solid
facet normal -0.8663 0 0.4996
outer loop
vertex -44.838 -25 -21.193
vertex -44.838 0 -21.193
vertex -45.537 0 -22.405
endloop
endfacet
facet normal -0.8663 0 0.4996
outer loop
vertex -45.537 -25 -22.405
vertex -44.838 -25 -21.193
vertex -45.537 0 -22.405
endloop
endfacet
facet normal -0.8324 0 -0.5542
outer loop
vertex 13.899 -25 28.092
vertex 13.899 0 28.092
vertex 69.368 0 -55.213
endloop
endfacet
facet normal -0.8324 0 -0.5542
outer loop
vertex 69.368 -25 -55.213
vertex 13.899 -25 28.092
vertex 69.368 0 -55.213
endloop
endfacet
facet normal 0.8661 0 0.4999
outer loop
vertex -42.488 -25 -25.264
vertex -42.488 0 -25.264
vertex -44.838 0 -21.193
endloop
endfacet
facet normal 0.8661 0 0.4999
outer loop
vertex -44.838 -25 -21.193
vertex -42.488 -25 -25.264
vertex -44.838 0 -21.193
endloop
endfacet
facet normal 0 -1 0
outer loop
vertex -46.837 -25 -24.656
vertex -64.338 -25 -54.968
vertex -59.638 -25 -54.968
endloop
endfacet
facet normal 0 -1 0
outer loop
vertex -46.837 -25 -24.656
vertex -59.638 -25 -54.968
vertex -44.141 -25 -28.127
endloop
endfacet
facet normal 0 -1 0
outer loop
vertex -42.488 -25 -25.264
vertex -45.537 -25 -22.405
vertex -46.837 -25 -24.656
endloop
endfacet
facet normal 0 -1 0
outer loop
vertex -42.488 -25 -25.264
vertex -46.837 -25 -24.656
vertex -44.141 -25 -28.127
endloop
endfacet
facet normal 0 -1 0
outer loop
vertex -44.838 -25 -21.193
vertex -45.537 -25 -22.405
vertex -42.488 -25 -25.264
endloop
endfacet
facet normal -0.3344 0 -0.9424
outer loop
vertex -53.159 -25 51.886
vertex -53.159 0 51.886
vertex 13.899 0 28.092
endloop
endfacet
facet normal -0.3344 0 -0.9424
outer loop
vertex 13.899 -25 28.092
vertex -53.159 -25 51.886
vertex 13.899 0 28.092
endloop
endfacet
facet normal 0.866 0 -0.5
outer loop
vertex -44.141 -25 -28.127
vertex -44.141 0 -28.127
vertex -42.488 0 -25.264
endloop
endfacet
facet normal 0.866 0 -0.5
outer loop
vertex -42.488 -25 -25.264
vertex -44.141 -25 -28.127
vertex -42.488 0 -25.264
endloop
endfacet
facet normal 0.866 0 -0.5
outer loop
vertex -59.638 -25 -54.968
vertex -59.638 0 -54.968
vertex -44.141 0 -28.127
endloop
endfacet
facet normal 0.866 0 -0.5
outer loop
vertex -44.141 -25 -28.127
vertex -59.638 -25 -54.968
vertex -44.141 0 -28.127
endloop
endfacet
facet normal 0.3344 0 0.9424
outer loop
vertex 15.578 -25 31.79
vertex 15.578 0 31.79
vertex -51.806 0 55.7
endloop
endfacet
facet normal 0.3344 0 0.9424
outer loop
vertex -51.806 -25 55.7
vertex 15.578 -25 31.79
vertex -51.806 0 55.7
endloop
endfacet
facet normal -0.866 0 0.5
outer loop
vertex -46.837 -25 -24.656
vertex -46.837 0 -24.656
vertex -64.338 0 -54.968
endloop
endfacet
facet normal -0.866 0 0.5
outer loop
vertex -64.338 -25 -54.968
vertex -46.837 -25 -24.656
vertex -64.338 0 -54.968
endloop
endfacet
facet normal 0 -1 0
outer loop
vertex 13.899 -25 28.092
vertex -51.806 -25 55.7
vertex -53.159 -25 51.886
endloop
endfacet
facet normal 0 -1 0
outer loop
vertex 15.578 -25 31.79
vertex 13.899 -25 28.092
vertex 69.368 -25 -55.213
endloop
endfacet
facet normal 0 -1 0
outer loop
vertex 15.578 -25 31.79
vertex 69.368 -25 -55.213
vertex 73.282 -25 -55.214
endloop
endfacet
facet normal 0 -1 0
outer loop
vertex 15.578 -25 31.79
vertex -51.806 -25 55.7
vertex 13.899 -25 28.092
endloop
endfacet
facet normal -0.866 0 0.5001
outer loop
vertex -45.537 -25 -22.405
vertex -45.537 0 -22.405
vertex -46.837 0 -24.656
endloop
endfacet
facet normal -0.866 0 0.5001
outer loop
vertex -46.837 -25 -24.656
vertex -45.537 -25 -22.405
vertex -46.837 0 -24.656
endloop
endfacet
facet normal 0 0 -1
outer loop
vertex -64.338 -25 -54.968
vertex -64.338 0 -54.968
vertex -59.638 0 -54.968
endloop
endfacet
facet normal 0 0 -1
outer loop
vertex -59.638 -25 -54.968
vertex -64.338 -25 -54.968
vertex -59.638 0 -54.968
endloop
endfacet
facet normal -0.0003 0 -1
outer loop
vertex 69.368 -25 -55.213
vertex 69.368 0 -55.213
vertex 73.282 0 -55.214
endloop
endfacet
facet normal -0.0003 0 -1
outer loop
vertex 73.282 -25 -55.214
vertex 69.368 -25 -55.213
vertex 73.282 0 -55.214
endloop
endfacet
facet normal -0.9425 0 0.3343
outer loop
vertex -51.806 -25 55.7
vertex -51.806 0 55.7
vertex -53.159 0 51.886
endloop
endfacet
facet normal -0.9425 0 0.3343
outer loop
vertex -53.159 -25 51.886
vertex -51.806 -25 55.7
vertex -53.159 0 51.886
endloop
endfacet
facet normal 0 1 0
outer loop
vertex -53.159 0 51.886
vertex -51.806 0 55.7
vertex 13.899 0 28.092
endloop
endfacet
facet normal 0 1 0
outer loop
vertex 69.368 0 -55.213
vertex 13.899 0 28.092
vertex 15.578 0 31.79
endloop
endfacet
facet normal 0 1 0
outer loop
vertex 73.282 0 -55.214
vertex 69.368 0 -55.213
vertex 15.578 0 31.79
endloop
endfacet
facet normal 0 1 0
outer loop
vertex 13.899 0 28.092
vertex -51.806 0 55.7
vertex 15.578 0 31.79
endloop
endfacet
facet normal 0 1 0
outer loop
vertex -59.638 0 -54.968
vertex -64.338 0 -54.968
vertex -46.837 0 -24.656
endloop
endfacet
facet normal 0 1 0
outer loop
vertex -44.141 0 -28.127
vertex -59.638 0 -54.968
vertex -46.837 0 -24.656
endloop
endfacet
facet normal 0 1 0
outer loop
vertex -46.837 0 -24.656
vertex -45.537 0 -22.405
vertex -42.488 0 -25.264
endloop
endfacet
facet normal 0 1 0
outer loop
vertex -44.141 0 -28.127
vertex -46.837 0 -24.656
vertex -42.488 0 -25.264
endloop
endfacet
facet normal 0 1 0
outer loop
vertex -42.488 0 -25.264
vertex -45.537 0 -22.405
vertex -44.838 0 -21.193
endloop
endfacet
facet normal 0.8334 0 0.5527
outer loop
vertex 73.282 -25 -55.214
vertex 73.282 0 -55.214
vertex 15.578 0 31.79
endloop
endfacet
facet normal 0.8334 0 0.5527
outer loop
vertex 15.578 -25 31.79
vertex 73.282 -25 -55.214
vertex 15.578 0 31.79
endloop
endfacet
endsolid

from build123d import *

# Parameters (mm, degrees)
F1_DEPTH = 25


with BuildPart() as f1:
    # F0 (on Front) → F1 (new body)
    with BuildSketch(Plane.XZ):
        Polygon((13.89865, 28.091678), (69.368124, -55.212756), (73.281549, -55.213907), (15.577925, 31.789838), (-51.805659, 55.700144), (-53.158953, 51.886314), align=None)
        Polygon((-64.338015, -54.9684), (-59.638015, -54.9684), (-44.140906, -28.126619), (-42.488015, -25.263728), (-44.838015, -21.193409), (-45.53734, -22.404676), (-46.837334, -24.656332), align=None)
    extrude(amount=F1_DEPTH)


solid = f1.part
